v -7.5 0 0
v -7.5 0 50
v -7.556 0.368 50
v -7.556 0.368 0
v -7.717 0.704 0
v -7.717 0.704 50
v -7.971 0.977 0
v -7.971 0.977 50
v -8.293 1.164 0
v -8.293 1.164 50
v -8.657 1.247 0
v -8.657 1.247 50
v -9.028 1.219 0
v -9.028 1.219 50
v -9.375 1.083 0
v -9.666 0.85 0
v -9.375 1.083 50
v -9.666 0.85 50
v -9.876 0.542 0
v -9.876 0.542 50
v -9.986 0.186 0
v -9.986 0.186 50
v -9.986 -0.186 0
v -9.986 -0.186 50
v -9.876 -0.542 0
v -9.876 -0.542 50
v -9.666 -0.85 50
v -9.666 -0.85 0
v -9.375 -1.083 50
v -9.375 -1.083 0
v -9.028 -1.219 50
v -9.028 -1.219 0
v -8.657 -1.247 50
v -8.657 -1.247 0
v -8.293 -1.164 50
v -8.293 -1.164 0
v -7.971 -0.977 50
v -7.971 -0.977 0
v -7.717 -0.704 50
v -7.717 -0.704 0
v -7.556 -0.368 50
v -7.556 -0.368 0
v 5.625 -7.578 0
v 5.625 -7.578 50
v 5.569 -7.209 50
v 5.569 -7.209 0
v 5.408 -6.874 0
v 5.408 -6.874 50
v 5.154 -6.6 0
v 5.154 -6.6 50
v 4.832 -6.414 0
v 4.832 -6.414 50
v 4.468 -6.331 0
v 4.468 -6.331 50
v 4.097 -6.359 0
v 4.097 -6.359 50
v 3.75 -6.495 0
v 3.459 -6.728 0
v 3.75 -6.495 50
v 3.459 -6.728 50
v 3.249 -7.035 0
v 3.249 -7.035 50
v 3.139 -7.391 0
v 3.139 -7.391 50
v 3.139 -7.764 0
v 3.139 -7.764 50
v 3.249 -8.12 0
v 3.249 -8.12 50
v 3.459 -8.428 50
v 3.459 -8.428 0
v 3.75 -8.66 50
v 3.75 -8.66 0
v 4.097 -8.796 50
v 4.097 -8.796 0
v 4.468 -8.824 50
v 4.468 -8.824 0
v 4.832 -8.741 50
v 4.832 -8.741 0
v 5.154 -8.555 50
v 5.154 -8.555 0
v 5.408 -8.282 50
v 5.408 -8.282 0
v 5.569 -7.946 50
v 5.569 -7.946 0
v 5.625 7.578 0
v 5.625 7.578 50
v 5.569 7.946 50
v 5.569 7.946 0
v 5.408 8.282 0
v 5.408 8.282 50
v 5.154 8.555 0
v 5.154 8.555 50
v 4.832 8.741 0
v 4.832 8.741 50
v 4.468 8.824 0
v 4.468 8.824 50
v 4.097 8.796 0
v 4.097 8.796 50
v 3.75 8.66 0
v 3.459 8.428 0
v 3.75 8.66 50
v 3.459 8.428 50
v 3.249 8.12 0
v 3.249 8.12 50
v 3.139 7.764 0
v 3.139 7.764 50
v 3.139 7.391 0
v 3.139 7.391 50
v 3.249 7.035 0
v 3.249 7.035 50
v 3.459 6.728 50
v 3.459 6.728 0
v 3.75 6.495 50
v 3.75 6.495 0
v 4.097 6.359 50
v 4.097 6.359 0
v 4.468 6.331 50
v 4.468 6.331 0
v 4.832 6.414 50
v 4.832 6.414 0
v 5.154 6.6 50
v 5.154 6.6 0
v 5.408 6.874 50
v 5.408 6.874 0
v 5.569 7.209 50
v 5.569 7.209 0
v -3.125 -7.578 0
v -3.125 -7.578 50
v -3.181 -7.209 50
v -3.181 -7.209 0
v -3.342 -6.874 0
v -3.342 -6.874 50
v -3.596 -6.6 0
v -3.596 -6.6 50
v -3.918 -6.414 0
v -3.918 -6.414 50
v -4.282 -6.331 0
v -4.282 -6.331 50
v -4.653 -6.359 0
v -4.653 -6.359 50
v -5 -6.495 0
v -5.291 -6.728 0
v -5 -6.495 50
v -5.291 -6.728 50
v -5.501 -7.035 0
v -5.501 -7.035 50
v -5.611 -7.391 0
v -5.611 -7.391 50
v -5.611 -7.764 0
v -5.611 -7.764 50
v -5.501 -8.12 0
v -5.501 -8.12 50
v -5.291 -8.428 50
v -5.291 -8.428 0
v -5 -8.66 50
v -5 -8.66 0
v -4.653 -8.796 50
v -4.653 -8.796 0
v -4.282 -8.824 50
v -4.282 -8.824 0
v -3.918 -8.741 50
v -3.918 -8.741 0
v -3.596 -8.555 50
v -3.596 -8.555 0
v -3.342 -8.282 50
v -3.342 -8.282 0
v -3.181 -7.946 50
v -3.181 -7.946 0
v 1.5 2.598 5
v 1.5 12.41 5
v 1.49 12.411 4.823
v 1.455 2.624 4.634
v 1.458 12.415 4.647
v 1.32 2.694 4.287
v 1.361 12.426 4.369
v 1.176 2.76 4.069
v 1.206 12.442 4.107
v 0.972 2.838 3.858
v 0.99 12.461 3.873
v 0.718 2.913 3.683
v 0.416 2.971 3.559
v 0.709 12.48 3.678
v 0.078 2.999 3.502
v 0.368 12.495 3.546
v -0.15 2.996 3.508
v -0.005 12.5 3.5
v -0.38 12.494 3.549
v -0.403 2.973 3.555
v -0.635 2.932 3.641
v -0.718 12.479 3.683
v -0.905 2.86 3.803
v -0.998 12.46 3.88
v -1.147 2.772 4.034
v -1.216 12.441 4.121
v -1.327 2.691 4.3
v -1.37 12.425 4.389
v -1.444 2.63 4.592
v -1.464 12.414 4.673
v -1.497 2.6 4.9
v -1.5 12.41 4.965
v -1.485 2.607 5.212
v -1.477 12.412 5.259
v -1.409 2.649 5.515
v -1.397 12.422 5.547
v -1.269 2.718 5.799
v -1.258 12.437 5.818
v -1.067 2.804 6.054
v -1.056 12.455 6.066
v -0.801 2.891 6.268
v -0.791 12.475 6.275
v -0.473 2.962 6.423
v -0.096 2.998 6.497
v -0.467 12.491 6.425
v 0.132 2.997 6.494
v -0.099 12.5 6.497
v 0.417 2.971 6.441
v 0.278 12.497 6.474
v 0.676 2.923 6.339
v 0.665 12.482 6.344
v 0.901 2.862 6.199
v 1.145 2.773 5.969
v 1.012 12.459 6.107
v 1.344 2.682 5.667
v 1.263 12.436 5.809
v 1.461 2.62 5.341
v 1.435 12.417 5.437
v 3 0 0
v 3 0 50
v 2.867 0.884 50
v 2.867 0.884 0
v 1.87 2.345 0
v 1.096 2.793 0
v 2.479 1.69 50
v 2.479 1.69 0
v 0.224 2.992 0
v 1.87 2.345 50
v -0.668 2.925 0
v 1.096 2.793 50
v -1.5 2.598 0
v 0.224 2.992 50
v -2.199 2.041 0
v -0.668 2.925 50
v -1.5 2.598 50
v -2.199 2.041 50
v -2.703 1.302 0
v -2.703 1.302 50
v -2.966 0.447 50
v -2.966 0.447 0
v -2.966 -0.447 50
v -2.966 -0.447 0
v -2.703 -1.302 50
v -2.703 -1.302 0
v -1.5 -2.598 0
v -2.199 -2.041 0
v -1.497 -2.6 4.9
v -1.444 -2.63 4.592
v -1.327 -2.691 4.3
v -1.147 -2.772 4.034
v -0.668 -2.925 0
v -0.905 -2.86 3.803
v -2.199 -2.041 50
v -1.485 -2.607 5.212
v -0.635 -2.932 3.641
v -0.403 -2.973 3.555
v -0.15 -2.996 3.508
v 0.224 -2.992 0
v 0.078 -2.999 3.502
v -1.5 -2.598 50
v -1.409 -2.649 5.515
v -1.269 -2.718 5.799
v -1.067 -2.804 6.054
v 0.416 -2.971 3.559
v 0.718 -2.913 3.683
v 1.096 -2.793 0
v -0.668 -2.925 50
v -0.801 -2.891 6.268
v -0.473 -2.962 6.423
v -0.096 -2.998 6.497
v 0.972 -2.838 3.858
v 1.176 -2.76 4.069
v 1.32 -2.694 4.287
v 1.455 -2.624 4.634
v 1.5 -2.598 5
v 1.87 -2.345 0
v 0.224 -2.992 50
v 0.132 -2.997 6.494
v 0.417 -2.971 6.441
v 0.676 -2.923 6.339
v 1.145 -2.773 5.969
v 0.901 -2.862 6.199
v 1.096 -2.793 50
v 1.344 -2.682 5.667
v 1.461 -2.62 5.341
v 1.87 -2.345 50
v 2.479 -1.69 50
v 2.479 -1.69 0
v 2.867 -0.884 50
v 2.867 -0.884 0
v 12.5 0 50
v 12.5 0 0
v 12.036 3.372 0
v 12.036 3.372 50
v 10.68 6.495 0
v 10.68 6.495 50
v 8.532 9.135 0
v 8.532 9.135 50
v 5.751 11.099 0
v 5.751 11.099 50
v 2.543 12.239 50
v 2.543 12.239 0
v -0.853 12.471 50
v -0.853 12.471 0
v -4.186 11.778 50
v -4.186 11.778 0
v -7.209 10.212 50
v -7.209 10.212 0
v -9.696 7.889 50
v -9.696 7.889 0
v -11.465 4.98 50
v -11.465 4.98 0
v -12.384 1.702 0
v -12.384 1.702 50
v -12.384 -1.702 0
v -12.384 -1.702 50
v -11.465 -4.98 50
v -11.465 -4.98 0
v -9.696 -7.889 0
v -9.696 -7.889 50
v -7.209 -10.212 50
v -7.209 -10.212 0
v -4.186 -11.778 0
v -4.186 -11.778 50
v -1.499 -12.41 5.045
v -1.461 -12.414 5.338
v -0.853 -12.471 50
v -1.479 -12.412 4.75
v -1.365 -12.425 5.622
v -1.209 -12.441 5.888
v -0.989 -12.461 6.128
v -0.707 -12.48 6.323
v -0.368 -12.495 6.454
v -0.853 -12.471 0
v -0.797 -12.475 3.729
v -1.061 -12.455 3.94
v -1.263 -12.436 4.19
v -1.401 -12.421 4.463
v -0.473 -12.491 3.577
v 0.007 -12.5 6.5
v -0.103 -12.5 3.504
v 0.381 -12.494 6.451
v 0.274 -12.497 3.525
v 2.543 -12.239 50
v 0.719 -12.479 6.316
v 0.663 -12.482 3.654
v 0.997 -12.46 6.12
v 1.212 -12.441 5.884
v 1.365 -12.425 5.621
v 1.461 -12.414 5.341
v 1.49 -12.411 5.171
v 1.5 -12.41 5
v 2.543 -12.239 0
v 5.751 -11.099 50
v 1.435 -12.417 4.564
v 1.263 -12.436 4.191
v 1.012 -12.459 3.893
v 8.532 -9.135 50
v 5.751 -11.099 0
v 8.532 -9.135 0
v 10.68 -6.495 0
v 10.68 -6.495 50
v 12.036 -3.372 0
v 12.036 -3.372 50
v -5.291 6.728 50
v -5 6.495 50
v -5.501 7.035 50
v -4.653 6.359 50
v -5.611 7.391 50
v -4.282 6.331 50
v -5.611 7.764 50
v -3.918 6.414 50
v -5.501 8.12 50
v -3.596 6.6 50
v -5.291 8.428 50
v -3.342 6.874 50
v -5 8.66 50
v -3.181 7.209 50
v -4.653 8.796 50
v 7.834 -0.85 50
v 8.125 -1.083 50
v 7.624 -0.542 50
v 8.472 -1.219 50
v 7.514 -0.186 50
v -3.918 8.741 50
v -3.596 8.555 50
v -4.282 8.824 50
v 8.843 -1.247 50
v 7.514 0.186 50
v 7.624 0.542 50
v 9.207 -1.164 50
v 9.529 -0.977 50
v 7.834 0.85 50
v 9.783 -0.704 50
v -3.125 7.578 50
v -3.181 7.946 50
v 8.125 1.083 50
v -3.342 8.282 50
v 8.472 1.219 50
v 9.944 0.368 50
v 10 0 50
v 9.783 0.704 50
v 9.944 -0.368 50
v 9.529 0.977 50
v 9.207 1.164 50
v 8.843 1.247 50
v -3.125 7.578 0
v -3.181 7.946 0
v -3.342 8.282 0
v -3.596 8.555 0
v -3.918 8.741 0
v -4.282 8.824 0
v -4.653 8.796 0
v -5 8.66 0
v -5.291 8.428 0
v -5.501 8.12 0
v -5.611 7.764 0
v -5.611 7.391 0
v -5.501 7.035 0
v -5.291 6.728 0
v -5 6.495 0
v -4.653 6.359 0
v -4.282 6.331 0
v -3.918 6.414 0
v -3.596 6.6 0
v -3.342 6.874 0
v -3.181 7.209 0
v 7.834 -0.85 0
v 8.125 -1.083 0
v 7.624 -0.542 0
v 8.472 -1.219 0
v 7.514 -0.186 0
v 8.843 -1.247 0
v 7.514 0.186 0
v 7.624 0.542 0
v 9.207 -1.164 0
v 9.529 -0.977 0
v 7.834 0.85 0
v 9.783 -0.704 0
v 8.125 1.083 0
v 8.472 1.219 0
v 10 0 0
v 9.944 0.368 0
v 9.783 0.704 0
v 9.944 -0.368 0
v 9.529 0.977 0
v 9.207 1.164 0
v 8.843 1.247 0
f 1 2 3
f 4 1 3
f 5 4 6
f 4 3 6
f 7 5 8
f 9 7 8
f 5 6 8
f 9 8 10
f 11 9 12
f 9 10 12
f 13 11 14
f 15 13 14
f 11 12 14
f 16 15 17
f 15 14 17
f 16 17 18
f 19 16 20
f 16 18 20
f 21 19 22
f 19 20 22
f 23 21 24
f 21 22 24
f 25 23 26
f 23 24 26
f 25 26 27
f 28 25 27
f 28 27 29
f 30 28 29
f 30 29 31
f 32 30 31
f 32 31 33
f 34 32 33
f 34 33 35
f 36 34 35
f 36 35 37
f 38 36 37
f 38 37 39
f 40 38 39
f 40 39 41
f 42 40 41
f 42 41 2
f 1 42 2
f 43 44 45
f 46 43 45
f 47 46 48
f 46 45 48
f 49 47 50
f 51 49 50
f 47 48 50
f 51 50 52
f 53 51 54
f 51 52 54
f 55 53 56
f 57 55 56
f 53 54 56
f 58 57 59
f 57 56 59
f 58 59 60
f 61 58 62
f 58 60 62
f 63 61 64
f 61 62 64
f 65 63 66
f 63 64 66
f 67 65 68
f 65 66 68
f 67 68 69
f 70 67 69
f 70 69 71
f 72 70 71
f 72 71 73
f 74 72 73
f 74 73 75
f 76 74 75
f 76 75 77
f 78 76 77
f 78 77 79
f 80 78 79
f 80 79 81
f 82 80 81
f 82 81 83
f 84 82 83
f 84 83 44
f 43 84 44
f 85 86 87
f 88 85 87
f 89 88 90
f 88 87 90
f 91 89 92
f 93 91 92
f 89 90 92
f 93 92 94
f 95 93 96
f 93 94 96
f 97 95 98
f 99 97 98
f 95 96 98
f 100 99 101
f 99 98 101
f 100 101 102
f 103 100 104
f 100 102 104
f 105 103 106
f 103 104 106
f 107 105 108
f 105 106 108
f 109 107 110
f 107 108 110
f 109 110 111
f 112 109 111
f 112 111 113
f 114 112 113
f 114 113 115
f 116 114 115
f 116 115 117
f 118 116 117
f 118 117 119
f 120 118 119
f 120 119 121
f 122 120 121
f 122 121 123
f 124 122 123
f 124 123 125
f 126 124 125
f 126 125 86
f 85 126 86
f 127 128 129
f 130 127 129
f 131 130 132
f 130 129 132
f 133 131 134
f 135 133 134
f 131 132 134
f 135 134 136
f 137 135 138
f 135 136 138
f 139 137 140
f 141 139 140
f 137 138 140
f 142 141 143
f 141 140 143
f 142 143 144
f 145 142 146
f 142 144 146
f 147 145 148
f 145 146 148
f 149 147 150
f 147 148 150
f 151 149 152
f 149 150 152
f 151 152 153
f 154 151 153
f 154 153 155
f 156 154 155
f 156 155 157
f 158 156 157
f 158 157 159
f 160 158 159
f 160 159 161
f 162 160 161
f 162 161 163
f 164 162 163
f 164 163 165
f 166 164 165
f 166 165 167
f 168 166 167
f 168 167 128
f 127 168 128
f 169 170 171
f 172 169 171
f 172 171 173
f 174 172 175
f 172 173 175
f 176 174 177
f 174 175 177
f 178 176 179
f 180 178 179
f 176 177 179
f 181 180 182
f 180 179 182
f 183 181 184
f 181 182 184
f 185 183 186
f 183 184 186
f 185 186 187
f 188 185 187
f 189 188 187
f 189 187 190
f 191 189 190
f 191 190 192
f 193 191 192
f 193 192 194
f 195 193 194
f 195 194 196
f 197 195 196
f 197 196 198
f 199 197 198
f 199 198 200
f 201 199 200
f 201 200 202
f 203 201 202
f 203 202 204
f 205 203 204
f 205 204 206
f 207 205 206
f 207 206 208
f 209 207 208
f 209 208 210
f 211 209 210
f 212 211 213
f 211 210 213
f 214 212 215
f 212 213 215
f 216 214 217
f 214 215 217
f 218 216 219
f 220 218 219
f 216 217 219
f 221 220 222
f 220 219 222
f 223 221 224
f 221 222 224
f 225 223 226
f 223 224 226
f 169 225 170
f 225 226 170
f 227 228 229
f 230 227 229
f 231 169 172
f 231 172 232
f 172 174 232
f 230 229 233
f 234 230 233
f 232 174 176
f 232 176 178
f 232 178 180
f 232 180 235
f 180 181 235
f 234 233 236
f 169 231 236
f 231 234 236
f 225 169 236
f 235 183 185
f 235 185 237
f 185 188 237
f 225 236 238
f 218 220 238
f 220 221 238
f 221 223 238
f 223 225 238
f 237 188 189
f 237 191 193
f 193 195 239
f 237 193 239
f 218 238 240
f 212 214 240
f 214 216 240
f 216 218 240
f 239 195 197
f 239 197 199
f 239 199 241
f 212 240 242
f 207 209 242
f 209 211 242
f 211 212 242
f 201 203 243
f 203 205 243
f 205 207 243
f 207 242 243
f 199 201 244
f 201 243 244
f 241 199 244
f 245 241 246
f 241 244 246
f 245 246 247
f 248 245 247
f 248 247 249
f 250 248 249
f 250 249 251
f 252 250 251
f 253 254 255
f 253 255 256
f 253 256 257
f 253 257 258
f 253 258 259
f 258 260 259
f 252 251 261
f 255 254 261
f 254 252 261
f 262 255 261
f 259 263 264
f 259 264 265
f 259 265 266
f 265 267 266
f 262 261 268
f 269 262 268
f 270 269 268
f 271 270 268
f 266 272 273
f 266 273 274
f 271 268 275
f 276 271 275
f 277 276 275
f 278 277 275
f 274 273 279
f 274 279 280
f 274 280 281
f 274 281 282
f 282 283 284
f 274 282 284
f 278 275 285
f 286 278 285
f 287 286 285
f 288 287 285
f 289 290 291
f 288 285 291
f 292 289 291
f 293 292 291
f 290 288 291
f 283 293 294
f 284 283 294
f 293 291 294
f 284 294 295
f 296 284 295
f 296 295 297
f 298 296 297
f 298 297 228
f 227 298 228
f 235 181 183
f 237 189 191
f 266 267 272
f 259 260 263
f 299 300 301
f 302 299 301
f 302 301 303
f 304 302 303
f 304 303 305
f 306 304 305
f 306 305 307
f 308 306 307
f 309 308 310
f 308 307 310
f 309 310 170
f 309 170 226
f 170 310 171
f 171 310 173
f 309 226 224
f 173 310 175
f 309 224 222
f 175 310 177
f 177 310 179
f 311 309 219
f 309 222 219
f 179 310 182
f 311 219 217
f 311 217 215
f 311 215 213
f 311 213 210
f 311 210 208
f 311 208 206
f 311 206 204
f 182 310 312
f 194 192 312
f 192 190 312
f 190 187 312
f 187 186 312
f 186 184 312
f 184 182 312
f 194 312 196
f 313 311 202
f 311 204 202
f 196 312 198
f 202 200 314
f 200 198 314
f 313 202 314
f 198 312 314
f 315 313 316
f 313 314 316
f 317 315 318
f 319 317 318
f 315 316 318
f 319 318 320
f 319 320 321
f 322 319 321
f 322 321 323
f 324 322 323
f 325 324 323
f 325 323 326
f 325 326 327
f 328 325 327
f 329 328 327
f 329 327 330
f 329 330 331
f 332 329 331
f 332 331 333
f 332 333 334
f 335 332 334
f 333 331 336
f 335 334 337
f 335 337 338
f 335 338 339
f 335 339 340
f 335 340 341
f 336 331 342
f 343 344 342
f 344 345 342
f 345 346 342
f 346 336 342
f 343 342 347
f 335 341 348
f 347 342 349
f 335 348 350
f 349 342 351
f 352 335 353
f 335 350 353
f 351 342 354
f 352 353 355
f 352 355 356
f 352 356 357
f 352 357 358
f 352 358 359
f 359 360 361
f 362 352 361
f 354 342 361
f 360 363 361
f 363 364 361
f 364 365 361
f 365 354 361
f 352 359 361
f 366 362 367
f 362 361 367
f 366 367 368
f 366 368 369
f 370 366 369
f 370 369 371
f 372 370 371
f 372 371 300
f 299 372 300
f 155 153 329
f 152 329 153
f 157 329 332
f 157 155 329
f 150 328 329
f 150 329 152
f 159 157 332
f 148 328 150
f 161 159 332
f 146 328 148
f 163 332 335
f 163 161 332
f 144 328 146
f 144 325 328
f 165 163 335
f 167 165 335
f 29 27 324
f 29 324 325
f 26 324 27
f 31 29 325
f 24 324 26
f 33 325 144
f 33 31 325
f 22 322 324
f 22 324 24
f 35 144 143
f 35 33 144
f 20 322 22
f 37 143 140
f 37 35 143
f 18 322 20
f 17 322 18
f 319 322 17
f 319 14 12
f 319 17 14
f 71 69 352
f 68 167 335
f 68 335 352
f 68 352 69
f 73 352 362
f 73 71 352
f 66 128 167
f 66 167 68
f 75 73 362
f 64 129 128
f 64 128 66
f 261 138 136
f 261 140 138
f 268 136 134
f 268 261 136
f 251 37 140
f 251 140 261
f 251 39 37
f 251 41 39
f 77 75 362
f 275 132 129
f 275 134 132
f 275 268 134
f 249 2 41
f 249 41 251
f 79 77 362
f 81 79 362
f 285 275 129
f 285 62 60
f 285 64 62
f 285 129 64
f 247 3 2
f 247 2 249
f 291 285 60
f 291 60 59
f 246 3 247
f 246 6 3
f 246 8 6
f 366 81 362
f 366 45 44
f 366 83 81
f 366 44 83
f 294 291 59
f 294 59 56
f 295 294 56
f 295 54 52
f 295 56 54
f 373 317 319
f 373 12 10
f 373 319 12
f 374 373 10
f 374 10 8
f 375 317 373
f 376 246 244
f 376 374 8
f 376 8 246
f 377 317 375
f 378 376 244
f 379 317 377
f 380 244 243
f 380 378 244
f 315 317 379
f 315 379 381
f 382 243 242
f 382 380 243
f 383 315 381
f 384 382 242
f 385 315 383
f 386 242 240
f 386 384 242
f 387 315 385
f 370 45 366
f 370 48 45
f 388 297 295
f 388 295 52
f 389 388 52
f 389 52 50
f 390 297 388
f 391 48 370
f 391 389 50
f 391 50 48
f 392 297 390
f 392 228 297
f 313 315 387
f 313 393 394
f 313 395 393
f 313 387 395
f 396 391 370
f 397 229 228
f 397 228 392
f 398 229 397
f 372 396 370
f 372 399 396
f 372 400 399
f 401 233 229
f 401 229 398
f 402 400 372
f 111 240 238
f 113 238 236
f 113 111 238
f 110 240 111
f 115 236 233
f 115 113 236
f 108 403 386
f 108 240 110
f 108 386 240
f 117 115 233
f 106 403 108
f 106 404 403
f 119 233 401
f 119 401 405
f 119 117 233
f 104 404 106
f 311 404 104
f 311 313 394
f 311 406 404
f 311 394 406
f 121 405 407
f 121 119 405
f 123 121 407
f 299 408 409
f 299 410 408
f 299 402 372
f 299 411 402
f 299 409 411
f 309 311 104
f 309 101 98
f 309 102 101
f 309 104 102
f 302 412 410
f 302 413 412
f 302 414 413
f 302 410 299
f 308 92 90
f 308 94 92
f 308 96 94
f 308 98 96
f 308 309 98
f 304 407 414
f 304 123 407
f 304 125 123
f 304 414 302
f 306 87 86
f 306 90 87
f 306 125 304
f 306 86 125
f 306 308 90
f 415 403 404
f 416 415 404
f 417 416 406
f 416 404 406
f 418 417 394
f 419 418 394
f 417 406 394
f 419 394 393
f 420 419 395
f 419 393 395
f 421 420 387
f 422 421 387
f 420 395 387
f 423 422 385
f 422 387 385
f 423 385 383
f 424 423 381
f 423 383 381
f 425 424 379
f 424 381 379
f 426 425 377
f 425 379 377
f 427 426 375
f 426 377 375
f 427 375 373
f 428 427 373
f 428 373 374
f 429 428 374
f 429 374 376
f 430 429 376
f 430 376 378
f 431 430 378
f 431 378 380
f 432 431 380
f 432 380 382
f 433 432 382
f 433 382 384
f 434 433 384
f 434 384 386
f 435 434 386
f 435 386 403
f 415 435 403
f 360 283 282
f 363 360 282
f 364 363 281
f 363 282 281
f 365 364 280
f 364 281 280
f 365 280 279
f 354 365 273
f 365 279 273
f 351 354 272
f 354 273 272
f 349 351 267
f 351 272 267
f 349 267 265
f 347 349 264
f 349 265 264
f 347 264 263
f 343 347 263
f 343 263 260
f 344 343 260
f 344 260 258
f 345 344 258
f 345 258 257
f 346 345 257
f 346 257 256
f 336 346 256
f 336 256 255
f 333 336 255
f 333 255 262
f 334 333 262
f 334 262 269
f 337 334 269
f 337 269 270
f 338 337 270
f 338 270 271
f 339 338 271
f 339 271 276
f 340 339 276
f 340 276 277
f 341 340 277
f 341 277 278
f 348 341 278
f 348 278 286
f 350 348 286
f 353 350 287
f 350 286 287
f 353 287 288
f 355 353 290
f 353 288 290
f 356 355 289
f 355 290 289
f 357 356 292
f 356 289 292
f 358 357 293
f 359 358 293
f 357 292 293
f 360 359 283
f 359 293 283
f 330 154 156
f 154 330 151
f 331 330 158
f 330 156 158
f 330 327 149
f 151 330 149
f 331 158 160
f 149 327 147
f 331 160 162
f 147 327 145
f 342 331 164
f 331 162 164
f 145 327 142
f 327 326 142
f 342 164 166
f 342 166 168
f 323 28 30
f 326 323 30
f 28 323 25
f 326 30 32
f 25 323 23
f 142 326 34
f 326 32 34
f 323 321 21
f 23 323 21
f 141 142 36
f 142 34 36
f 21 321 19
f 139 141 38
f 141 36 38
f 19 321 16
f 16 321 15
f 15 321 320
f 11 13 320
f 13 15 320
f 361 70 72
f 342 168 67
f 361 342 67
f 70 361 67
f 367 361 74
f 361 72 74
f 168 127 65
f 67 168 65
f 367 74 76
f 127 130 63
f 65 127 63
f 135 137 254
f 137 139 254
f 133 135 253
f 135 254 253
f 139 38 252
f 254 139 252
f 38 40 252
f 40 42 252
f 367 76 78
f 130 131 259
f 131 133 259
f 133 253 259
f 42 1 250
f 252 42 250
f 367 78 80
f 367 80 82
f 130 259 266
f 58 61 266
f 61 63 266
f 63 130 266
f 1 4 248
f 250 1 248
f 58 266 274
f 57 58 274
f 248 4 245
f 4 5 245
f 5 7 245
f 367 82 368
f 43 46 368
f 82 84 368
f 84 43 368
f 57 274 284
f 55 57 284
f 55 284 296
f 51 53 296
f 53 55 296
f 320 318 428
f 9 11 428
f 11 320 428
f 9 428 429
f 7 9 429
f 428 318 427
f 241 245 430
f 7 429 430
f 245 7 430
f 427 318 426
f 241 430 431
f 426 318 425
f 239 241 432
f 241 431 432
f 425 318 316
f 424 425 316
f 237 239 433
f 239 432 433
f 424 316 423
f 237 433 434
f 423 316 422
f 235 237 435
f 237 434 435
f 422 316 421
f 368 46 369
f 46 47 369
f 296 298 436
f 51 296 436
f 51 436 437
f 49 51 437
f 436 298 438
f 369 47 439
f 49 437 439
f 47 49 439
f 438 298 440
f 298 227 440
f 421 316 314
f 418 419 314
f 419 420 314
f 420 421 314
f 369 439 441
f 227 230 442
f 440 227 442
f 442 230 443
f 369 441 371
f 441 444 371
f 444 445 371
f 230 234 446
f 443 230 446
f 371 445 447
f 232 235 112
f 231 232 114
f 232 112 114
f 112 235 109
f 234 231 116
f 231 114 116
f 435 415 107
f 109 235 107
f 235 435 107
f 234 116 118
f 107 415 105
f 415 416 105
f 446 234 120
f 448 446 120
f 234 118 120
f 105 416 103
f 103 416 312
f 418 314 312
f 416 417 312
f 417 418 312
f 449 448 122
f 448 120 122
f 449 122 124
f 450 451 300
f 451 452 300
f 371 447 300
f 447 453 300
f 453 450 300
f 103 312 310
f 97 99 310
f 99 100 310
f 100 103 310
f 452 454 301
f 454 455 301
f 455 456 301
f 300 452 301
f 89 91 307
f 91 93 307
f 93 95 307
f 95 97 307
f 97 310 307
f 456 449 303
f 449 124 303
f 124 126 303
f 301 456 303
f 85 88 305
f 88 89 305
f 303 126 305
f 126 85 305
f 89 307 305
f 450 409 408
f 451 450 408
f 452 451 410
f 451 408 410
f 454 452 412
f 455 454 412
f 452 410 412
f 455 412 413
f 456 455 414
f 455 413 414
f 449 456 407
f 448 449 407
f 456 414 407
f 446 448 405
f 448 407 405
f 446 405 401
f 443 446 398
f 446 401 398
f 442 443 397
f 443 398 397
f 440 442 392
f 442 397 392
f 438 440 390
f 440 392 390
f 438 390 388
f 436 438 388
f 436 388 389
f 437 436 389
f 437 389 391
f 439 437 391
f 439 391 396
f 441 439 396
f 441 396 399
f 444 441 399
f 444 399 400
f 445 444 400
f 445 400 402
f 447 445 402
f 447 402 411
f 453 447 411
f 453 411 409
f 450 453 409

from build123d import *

# Parameters (mm, degrees)
CROQUIS1_R              = 12.5
SALIENTE_EXTRUIR1_DEPTH = 50
CROQUIS3_R              = 1.25
CROQUIS3_R_2            = 3
CORTAR_EXTRUIR1_DEPTH   = 51
CROQUIS6_R              = 1.5
CORTAR_EXTRUIR2_DEPTH   = 26


with BuildPart() as part:
    # Croquis1 → Saliente-Extruir1 (new body)
    with BuildSketch(Plane.XY):
        Circle(CROQUIS1_R)
    extrude(amount=SALIENTE_EXTRUIR1_DEPTH)

    # Croquis3 → Cortar-Extruir1 (cut, through all)
    with BuildSketch(Plane.XY.offset(50)):
        with Locations((8.75, 0)):
            Circle(CROQUIS3_R)
        with Locations((4.375, -7.577722283)):
            Circle(CROQUIS3_R)
        with Locations((-4.375, -7.577722283)):
            Circle(CROQUIS3_R)
        with Locations((-8.75, 0)):
            Circle(CROQUIS3_R)
        with Locations((-4.375, 7.577722283)):
            Circle(CROQUIS3_R)
        with Locations((4.375, 7.577722283)):
            Circle(CROQUIS3_R)
        Circle(CROQUIS3_R_2)
    extrude(amount=-CORTAR_EXTRUIR1_DEPTH, mode=Mode.SUBTRACT)

    # Croquis6 → Cortar-Extruir2 (cut, through all)
    with BuildSketch(Plane(origin=(0, 12.5, 0), x_dir=(1, 0, 0), z_dir=(0, 1, 0))):
        with Locations((0, -5)):
            Circle(CROQUIS6_R)
    extrude(amount=-CORTAR_EXTRUIR2_DEPTH, mode=Mode.SUBTRACT)


solid = part.part
